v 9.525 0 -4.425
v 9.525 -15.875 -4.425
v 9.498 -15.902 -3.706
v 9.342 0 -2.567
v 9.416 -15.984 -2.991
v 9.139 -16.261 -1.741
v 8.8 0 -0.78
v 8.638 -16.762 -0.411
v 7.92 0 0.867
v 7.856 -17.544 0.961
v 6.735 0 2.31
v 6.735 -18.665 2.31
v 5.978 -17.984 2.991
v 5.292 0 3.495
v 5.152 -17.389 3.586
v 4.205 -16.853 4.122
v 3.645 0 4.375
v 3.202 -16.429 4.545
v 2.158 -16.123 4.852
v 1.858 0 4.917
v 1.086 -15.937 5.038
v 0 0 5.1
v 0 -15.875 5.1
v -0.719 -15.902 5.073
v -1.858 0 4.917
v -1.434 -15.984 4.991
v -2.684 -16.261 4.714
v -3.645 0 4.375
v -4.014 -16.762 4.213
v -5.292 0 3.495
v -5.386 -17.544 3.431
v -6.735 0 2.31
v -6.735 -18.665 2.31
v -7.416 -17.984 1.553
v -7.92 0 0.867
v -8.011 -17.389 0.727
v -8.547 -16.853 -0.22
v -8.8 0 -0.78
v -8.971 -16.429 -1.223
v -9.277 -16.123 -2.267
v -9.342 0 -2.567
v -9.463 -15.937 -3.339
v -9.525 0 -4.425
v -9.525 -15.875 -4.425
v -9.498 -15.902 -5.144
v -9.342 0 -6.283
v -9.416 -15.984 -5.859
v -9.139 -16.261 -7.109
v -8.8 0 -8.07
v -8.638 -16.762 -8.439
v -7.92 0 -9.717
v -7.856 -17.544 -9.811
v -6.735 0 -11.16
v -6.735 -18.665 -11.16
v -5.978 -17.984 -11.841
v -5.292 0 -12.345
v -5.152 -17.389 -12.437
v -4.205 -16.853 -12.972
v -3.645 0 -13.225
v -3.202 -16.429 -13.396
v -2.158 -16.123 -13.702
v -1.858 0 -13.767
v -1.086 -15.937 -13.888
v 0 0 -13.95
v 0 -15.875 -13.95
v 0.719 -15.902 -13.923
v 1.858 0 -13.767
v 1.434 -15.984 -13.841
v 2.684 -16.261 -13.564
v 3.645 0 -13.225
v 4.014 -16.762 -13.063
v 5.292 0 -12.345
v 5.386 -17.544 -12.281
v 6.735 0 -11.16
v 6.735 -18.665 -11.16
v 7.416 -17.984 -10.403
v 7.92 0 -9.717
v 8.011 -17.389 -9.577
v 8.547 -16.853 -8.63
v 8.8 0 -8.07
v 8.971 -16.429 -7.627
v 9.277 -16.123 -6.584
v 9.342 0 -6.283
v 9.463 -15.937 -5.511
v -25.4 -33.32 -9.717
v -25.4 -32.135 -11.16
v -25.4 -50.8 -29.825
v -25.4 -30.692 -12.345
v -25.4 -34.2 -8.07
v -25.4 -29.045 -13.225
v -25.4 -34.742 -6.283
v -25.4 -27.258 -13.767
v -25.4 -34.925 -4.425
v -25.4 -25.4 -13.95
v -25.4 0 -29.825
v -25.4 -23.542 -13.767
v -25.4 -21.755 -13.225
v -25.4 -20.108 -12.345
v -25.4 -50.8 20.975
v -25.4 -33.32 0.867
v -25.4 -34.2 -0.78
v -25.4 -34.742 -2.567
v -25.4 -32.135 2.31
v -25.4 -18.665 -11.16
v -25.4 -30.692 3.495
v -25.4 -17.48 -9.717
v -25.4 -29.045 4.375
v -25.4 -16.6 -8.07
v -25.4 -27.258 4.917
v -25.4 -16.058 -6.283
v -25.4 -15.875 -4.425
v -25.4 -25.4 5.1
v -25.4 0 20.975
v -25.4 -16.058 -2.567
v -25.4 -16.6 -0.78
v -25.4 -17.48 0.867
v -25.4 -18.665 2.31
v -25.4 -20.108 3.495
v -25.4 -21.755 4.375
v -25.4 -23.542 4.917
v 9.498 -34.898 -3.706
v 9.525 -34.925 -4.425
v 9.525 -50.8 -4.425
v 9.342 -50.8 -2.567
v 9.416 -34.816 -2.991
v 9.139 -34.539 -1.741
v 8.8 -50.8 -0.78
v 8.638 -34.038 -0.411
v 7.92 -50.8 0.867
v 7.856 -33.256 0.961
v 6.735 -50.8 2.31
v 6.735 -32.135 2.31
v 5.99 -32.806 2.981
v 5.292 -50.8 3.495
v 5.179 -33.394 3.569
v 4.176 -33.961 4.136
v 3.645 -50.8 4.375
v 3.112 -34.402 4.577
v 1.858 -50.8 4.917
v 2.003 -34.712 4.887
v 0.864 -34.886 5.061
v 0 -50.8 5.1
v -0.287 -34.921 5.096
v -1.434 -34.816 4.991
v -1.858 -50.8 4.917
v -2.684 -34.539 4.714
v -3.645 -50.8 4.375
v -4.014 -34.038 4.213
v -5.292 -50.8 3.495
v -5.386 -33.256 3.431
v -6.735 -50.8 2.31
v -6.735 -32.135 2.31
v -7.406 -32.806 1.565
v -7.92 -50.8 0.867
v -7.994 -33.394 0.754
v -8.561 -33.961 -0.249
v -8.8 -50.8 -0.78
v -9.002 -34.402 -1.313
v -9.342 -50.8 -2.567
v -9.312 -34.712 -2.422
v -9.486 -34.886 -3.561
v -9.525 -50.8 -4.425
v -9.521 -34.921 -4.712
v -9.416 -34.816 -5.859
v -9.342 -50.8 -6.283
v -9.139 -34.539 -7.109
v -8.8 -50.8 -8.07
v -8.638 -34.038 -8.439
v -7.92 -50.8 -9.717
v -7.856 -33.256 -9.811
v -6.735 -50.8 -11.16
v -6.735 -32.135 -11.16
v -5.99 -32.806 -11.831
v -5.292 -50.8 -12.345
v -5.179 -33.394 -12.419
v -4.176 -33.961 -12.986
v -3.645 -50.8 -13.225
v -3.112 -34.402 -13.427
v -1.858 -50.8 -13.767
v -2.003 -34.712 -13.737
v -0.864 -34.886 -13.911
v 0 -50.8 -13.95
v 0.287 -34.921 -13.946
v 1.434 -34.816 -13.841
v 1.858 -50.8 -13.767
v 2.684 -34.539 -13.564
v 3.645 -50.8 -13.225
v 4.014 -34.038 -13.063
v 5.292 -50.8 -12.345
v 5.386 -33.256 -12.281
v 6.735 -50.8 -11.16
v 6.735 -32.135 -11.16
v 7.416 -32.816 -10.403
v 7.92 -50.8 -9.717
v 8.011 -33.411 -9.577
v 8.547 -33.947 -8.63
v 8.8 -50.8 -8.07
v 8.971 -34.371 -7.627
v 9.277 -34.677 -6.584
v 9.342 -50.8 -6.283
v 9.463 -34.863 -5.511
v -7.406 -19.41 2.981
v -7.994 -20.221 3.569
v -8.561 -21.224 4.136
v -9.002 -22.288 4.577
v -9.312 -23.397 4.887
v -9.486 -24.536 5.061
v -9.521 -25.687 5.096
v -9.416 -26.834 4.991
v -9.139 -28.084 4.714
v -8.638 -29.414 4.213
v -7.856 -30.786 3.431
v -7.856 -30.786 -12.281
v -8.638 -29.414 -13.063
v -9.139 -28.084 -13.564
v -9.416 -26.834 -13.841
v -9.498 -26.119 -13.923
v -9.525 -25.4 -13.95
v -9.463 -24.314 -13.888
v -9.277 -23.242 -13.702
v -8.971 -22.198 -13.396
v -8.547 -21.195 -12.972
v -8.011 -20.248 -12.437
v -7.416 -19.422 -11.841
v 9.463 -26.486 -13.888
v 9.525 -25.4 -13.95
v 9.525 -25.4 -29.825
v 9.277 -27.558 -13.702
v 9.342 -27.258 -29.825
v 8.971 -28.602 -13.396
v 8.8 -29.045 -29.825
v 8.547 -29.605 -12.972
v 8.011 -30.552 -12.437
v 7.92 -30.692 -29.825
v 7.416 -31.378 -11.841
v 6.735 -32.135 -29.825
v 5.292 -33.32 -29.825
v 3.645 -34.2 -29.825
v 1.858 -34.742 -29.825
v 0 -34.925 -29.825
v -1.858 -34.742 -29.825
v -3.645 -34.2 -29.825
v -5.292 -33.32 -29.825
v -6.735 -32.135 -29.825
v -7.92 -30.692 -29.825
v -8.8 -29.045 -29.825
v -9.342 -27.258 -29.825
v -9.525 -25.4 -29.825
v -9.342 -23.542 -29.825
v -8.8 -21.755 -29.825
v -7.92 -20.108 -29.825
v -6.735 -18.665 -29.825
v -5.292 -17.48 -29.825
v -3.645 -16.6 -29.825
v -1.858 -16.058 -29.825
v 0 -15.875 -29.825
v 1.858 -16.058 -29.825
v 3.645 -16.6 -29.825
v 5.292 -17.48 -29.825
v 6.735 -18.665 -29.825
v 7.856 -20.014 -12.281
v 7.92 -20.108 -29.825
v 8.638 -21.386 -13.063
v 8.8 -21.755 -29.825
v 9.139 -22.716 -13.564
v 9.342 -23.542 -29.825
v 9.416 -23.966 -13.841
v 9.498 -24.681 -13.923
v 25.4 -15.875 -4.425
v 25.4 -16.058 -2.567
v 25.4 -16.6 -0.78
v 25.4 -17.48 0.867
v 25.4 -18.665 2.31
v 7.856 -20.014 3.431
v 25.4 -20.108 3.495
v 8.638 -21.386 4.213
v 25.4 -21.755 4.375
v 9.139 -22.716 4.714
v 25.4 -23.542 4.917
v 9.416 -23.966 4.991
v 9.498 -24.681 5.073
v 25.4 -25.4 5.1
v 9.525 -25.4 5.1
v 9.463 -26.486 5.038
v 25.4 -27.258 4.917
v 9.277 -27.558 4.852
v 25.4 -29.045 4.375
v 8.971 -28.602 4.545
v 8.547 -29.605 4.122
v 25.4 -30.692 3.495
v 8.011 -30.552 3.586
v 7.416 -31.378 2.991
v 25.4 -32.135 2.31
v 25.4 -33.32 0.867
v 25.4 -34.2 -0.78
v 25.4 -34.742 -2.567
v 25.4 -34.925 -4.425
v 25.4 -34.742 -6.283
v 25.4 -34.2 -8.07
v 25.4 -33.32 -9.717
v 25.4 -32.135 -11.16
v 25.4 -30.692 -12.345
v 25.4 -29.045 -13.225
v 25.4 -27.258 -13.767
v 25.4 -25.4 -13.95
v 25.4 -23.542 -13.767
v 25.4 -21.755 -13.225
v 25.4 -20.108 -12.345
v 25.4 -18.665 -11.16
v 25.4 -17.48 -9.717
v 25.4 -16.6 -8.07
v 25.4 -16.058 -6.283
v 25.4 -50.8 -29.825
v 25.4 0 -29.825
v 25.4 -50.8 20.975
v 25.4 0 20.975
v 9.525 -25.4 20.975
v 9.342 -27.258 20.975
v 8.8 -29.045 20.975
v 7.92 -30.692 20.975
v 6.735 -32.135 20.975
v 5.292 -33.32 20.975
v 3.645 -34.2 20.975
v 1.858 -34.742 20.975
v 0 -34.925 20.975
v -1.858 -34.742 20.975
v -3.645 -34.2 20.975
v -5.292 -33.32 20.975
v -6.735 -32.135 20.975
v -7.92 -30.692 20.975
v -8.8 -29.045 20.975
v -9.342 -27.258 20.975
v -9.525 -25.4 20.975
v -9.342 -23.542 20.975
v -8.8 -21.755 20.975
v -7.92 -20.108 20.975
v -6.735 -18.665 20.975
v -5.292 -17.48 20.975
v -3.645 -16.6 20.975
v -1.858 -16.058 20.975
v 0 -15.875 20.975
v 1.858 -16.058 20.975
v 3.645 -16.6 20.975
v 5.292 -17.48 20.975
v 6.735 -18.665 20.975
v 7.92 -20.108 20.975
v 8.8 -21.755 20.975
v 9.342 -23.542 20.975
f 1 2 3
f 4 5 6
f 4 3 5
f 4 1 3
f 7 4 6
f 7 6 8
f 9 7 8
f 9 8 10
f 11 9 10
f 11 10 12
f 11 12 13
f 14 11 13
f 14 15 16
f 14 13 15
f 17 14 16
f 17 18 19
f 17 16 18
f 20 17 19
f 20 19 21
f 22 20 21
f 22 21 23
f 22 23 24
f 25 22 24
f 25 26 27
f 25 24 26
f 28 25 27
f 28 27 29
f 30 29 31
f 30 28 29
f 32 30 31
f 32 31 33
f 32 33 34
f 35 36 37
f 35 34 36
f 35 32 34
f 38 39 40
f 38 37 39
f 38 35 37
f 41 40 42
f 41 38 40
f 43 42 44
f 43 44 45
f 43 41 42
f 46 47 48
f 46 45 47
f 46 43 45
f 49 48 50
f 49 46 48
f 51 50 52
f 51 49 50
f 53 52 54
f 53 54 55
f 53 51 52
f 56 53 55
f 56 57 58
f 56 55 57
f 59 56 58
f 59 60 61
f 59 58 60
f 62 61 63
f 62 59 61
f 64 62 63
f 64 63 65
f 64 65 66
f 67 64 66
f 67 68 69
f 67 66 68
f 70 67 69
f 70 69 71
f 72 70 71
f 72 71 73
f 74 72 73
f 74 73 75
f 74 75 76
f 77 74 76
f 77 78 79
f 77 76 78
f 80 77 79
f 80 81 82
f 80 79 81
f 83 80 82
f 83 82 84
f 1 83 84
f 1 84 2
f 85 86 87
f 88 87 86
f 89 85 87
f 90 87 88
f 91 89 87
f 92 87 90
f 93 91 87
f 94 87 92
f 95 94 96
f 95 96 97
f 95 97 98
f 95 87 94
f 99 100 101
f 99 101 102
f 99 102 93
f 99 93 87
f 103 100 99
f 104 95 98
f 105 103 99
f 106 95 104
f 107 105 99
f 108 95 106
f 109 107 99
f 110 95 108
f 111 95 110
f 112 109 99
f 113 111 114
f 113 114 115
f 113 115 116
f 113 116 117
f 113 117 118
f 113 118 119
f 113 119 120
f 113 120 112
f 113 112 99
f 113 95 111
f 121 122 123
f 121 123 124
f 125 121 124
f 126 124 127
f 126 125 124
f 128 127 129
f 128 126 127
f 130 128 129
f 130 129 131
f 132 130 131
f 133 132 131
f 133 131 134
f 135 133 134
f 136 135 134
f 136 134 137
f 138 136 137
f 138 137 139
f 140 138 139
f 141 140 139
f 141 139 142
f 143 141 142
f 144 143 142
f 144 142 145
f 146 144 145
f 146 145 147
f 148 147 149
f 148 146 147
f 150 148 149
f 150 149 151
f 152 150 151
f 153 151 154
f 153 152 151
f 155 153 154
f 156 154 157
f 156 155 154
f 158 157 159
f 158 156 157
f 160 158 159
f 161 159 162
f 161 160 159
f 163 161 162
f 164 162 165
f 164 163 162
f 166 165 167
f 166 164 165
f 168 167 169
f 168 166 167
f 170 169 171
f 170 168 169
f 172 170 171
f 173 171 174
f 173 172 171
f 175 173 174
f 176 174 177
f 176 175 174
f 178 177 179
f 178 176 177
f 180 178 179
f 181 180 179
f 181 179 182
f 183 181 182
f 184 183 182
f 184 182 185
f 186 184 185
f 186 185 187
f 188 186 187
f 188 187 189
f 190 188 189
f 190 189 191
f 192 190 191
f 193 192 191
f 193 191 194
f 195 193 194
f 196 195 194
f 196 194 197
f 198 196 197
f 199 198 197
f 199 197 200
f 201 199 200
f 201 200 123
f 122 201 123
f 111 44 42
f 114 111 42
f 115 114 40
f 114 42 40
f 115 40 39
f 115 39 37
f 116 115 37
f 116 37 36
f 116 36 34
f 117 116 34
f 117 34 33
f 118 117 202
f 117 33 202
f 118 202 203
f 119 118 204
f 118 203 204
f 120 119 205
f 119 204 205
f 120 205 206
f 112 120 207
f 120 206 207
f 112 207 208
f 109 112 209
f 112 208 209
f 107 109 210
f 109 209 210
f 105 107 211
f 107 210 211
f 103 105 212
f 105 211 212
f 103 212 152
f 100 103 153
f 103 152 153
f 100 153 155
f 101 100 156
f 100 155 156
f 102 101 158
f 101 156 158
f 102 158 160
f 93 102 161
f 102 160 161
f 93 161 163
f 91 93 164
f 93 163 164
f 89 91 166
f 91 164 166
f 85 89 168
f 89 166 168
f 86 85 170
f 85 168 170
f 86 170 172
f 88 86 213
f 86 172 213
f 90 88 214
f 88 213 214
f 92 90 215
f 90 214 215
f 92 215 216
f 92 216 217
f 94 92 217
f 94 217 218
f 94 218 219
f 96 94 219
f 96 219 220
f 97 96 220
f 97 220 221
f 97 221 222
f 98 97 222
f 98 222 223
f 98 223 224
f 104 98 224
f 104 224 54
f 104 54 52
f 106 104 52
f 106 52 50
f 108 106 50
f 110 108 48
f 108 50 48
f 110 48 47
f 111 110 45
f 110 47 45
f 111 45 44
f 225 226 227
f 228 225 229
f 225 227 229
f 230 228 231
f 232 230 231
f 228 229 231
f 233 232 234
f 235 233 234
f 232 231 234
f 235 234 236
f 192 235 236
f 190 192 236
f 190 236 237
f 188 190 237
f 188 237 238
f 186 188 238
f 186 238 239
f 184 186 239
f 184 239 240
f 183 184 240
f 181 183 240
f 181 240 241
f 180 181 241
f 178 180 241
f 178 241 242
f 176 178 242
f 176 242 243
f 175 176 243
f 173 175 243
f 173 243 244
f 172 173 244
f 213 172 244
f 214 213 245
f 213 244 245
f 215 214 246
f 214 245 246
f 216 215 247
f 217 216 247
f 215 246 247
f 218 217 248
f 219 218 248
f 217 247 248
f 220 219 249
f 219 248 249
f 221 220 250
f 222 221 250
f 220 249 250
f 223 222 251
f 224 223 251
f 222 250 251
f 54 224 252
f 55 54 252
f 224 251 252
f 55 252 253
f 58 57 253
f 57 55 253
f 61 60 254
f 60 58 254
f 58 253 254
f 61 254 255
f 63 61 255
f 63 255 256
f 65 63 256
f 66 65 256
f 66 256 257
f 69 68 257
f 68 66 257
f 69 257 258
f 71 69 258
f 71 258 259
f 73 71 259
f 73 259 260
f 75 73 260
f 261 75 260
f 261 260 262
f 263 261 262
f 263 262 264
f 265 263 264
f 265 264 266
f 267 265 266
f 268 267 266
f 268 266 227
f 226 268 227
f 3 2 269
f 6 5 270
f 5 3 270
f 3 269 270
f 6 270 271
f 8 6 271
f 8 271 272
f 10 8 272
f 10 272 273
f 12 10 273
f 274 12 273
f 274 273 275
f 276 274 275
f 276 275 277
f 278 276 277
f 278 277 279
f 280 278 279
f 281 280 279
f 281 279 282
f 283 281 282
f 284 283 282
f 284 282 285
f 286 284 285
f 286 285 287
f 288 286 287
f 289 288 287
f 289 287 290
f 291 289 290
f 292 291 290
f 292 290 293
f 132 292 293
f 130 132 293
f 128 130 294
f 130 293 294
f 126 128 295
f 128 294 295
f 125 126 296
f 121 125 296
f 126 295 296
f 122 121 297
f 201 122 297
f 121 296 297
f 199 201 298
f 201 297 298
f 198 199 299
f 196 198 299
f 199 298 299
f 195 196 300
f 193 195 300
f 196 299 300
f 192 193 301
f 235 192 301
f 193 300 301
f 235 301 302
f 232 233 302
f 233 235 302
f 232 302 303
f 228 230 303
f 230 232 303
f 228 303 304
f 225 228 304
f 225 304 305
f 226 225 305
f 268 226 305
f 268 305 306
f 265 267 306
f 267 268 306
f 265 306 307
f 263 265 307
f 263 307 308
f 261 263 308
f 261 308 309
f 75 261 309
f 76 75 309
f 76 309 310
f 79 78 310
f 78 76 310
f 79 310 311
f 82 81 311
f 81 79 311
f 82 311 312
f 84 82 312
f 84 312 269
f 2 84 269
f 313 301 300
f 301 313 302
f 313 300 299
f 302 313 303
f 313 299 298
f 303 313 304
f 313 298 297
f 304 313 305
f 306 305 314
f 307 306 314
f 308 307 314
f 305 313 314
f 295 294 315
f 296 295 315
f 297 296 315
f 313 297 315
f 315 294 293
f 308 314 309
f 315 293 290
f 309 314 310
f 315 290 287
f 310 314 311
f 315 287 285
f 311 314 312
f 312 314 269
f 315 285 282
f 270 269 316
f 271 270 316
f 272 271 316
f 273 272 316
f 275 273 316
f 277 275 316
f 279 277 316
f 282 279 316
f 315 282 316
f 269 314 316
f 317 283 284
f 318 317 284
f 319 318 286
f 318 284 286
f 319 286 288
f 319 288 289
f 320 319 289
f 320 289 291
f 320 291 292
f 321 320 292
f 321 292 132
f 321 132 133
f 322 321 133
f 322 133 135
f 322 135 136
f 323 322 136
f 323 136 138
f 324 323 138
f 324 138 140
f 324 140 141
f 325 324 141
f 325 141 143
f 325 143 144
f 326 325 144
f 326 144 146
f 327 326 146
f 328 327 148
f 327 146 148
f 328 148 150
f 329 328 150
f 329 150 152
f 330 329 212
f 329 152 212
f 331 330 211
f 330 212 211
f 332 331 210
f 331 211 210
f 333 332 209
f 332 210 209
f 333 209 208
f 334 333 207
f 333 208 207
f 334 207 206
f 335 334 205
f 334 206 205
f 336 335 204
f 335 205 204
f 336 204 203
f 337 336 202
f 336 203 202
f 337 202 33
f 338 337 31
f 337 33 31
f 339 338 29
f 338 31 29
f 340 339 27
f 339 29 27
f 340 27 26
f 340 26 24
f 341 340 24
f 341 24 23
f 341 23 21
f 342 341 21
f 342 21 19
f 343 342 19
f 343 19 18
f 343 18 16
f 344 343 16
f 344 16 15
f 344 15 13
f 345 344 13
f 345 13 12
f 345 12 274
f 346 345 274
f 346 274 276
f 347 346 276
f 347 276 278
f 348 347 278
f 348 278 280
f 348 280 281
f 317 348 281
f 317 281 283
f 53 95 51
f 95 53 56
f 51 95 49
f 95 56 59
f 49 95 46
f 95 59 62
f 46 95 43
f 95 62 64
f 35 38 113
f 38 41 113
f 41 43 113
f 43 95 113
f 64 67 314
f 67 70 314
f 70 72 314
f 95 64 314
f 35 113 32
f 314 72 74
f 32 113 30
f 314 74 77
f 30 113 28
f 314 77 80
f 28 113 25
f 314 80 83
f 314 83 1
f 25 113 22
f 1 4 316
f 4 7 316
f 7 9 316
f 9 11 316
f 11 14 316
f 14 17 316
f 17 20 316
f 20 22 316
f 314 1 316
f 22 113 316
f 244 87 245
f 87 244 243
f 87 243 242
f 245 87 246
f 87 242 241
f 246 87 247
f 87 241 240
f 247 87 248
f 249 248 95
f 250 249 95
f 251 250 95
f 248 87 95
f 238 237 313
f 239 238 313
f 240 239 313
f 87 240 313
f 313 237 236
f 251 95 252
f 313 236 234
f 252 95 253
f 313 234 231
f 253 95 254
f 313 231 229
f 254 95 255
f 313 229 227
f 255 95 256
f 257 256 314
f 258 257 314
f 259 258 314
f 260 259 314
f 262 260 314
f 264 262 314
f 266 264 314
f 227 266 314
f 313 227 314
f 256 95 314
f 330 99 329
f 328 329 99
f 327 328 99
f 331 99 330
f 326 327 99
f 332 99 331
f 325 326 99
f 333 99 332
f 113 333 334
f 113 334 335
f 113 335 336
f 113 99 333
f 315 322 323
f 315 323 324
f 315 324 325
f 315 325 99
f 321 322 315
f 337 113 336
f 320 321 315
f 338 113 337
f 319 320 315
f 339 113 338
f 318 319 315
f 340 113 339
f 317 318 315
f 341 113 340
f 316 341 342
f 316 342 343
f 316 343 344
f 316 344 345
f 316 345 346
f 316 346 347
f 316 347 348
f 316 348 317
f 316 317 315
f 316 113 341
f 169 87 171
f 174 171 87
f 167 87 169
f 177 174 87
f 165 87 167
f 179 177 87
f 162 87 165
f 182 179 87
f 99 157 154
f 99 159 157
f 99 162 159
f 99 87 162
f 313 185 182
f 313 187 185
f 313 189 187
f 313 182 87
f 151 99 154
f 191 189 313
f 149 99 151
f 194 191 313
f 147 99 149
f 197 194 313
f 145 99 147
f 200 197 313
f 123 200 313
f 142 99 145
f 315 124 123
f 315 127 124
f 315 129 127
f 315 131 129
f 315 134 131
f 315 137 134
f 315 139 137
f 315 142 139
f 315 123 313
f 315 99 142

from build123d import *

# Parameters (mm, degrees)
F0_W     = 50.8
F0_H     = 50.8
F0_R     = 9.525
F1_DEPTH = 50.8
F2_R     = 9.525
F3_DEPTH = 50.8
F4_R     = 9.525
F5_DEPTH = 50.8


with BuildPart() as f1:
    # F0 (on Front) → F1 (new body)
    with BuildSketch(Plane.XZ):
        with Locations((0, -4.425067)):
            Rectangle(F0_W, F0_H)
        with Locations((0, -4.425067)):
            Circle(F0_R, mode=Mode.SUBTRACT)
    extrude(amount=F1_DEPTH)

    # F2 (on face) → F3 (cut)
    with BuildSketch(Plane(origin=(0, 0, -29.825067), x_dir=(1, 0, 0), z_dir=(0, 0, -1))):
        with Locations((0, 25.4)):
            Circle(F2_R)
    extrude(amount=-F3_DEPTH, mode=Mode.SUBTRACT)

    # F4 (on face) → F5 (cut)
    with BuildSketch(Plane.YZ.offset(25.4)):
        with Locations((-25.4, -4.425067)):
            Circle(F4_R)
    extrude(amount=-F5_DEPTH, mode=Mode.SUBTRACT)


solid = f1.part
